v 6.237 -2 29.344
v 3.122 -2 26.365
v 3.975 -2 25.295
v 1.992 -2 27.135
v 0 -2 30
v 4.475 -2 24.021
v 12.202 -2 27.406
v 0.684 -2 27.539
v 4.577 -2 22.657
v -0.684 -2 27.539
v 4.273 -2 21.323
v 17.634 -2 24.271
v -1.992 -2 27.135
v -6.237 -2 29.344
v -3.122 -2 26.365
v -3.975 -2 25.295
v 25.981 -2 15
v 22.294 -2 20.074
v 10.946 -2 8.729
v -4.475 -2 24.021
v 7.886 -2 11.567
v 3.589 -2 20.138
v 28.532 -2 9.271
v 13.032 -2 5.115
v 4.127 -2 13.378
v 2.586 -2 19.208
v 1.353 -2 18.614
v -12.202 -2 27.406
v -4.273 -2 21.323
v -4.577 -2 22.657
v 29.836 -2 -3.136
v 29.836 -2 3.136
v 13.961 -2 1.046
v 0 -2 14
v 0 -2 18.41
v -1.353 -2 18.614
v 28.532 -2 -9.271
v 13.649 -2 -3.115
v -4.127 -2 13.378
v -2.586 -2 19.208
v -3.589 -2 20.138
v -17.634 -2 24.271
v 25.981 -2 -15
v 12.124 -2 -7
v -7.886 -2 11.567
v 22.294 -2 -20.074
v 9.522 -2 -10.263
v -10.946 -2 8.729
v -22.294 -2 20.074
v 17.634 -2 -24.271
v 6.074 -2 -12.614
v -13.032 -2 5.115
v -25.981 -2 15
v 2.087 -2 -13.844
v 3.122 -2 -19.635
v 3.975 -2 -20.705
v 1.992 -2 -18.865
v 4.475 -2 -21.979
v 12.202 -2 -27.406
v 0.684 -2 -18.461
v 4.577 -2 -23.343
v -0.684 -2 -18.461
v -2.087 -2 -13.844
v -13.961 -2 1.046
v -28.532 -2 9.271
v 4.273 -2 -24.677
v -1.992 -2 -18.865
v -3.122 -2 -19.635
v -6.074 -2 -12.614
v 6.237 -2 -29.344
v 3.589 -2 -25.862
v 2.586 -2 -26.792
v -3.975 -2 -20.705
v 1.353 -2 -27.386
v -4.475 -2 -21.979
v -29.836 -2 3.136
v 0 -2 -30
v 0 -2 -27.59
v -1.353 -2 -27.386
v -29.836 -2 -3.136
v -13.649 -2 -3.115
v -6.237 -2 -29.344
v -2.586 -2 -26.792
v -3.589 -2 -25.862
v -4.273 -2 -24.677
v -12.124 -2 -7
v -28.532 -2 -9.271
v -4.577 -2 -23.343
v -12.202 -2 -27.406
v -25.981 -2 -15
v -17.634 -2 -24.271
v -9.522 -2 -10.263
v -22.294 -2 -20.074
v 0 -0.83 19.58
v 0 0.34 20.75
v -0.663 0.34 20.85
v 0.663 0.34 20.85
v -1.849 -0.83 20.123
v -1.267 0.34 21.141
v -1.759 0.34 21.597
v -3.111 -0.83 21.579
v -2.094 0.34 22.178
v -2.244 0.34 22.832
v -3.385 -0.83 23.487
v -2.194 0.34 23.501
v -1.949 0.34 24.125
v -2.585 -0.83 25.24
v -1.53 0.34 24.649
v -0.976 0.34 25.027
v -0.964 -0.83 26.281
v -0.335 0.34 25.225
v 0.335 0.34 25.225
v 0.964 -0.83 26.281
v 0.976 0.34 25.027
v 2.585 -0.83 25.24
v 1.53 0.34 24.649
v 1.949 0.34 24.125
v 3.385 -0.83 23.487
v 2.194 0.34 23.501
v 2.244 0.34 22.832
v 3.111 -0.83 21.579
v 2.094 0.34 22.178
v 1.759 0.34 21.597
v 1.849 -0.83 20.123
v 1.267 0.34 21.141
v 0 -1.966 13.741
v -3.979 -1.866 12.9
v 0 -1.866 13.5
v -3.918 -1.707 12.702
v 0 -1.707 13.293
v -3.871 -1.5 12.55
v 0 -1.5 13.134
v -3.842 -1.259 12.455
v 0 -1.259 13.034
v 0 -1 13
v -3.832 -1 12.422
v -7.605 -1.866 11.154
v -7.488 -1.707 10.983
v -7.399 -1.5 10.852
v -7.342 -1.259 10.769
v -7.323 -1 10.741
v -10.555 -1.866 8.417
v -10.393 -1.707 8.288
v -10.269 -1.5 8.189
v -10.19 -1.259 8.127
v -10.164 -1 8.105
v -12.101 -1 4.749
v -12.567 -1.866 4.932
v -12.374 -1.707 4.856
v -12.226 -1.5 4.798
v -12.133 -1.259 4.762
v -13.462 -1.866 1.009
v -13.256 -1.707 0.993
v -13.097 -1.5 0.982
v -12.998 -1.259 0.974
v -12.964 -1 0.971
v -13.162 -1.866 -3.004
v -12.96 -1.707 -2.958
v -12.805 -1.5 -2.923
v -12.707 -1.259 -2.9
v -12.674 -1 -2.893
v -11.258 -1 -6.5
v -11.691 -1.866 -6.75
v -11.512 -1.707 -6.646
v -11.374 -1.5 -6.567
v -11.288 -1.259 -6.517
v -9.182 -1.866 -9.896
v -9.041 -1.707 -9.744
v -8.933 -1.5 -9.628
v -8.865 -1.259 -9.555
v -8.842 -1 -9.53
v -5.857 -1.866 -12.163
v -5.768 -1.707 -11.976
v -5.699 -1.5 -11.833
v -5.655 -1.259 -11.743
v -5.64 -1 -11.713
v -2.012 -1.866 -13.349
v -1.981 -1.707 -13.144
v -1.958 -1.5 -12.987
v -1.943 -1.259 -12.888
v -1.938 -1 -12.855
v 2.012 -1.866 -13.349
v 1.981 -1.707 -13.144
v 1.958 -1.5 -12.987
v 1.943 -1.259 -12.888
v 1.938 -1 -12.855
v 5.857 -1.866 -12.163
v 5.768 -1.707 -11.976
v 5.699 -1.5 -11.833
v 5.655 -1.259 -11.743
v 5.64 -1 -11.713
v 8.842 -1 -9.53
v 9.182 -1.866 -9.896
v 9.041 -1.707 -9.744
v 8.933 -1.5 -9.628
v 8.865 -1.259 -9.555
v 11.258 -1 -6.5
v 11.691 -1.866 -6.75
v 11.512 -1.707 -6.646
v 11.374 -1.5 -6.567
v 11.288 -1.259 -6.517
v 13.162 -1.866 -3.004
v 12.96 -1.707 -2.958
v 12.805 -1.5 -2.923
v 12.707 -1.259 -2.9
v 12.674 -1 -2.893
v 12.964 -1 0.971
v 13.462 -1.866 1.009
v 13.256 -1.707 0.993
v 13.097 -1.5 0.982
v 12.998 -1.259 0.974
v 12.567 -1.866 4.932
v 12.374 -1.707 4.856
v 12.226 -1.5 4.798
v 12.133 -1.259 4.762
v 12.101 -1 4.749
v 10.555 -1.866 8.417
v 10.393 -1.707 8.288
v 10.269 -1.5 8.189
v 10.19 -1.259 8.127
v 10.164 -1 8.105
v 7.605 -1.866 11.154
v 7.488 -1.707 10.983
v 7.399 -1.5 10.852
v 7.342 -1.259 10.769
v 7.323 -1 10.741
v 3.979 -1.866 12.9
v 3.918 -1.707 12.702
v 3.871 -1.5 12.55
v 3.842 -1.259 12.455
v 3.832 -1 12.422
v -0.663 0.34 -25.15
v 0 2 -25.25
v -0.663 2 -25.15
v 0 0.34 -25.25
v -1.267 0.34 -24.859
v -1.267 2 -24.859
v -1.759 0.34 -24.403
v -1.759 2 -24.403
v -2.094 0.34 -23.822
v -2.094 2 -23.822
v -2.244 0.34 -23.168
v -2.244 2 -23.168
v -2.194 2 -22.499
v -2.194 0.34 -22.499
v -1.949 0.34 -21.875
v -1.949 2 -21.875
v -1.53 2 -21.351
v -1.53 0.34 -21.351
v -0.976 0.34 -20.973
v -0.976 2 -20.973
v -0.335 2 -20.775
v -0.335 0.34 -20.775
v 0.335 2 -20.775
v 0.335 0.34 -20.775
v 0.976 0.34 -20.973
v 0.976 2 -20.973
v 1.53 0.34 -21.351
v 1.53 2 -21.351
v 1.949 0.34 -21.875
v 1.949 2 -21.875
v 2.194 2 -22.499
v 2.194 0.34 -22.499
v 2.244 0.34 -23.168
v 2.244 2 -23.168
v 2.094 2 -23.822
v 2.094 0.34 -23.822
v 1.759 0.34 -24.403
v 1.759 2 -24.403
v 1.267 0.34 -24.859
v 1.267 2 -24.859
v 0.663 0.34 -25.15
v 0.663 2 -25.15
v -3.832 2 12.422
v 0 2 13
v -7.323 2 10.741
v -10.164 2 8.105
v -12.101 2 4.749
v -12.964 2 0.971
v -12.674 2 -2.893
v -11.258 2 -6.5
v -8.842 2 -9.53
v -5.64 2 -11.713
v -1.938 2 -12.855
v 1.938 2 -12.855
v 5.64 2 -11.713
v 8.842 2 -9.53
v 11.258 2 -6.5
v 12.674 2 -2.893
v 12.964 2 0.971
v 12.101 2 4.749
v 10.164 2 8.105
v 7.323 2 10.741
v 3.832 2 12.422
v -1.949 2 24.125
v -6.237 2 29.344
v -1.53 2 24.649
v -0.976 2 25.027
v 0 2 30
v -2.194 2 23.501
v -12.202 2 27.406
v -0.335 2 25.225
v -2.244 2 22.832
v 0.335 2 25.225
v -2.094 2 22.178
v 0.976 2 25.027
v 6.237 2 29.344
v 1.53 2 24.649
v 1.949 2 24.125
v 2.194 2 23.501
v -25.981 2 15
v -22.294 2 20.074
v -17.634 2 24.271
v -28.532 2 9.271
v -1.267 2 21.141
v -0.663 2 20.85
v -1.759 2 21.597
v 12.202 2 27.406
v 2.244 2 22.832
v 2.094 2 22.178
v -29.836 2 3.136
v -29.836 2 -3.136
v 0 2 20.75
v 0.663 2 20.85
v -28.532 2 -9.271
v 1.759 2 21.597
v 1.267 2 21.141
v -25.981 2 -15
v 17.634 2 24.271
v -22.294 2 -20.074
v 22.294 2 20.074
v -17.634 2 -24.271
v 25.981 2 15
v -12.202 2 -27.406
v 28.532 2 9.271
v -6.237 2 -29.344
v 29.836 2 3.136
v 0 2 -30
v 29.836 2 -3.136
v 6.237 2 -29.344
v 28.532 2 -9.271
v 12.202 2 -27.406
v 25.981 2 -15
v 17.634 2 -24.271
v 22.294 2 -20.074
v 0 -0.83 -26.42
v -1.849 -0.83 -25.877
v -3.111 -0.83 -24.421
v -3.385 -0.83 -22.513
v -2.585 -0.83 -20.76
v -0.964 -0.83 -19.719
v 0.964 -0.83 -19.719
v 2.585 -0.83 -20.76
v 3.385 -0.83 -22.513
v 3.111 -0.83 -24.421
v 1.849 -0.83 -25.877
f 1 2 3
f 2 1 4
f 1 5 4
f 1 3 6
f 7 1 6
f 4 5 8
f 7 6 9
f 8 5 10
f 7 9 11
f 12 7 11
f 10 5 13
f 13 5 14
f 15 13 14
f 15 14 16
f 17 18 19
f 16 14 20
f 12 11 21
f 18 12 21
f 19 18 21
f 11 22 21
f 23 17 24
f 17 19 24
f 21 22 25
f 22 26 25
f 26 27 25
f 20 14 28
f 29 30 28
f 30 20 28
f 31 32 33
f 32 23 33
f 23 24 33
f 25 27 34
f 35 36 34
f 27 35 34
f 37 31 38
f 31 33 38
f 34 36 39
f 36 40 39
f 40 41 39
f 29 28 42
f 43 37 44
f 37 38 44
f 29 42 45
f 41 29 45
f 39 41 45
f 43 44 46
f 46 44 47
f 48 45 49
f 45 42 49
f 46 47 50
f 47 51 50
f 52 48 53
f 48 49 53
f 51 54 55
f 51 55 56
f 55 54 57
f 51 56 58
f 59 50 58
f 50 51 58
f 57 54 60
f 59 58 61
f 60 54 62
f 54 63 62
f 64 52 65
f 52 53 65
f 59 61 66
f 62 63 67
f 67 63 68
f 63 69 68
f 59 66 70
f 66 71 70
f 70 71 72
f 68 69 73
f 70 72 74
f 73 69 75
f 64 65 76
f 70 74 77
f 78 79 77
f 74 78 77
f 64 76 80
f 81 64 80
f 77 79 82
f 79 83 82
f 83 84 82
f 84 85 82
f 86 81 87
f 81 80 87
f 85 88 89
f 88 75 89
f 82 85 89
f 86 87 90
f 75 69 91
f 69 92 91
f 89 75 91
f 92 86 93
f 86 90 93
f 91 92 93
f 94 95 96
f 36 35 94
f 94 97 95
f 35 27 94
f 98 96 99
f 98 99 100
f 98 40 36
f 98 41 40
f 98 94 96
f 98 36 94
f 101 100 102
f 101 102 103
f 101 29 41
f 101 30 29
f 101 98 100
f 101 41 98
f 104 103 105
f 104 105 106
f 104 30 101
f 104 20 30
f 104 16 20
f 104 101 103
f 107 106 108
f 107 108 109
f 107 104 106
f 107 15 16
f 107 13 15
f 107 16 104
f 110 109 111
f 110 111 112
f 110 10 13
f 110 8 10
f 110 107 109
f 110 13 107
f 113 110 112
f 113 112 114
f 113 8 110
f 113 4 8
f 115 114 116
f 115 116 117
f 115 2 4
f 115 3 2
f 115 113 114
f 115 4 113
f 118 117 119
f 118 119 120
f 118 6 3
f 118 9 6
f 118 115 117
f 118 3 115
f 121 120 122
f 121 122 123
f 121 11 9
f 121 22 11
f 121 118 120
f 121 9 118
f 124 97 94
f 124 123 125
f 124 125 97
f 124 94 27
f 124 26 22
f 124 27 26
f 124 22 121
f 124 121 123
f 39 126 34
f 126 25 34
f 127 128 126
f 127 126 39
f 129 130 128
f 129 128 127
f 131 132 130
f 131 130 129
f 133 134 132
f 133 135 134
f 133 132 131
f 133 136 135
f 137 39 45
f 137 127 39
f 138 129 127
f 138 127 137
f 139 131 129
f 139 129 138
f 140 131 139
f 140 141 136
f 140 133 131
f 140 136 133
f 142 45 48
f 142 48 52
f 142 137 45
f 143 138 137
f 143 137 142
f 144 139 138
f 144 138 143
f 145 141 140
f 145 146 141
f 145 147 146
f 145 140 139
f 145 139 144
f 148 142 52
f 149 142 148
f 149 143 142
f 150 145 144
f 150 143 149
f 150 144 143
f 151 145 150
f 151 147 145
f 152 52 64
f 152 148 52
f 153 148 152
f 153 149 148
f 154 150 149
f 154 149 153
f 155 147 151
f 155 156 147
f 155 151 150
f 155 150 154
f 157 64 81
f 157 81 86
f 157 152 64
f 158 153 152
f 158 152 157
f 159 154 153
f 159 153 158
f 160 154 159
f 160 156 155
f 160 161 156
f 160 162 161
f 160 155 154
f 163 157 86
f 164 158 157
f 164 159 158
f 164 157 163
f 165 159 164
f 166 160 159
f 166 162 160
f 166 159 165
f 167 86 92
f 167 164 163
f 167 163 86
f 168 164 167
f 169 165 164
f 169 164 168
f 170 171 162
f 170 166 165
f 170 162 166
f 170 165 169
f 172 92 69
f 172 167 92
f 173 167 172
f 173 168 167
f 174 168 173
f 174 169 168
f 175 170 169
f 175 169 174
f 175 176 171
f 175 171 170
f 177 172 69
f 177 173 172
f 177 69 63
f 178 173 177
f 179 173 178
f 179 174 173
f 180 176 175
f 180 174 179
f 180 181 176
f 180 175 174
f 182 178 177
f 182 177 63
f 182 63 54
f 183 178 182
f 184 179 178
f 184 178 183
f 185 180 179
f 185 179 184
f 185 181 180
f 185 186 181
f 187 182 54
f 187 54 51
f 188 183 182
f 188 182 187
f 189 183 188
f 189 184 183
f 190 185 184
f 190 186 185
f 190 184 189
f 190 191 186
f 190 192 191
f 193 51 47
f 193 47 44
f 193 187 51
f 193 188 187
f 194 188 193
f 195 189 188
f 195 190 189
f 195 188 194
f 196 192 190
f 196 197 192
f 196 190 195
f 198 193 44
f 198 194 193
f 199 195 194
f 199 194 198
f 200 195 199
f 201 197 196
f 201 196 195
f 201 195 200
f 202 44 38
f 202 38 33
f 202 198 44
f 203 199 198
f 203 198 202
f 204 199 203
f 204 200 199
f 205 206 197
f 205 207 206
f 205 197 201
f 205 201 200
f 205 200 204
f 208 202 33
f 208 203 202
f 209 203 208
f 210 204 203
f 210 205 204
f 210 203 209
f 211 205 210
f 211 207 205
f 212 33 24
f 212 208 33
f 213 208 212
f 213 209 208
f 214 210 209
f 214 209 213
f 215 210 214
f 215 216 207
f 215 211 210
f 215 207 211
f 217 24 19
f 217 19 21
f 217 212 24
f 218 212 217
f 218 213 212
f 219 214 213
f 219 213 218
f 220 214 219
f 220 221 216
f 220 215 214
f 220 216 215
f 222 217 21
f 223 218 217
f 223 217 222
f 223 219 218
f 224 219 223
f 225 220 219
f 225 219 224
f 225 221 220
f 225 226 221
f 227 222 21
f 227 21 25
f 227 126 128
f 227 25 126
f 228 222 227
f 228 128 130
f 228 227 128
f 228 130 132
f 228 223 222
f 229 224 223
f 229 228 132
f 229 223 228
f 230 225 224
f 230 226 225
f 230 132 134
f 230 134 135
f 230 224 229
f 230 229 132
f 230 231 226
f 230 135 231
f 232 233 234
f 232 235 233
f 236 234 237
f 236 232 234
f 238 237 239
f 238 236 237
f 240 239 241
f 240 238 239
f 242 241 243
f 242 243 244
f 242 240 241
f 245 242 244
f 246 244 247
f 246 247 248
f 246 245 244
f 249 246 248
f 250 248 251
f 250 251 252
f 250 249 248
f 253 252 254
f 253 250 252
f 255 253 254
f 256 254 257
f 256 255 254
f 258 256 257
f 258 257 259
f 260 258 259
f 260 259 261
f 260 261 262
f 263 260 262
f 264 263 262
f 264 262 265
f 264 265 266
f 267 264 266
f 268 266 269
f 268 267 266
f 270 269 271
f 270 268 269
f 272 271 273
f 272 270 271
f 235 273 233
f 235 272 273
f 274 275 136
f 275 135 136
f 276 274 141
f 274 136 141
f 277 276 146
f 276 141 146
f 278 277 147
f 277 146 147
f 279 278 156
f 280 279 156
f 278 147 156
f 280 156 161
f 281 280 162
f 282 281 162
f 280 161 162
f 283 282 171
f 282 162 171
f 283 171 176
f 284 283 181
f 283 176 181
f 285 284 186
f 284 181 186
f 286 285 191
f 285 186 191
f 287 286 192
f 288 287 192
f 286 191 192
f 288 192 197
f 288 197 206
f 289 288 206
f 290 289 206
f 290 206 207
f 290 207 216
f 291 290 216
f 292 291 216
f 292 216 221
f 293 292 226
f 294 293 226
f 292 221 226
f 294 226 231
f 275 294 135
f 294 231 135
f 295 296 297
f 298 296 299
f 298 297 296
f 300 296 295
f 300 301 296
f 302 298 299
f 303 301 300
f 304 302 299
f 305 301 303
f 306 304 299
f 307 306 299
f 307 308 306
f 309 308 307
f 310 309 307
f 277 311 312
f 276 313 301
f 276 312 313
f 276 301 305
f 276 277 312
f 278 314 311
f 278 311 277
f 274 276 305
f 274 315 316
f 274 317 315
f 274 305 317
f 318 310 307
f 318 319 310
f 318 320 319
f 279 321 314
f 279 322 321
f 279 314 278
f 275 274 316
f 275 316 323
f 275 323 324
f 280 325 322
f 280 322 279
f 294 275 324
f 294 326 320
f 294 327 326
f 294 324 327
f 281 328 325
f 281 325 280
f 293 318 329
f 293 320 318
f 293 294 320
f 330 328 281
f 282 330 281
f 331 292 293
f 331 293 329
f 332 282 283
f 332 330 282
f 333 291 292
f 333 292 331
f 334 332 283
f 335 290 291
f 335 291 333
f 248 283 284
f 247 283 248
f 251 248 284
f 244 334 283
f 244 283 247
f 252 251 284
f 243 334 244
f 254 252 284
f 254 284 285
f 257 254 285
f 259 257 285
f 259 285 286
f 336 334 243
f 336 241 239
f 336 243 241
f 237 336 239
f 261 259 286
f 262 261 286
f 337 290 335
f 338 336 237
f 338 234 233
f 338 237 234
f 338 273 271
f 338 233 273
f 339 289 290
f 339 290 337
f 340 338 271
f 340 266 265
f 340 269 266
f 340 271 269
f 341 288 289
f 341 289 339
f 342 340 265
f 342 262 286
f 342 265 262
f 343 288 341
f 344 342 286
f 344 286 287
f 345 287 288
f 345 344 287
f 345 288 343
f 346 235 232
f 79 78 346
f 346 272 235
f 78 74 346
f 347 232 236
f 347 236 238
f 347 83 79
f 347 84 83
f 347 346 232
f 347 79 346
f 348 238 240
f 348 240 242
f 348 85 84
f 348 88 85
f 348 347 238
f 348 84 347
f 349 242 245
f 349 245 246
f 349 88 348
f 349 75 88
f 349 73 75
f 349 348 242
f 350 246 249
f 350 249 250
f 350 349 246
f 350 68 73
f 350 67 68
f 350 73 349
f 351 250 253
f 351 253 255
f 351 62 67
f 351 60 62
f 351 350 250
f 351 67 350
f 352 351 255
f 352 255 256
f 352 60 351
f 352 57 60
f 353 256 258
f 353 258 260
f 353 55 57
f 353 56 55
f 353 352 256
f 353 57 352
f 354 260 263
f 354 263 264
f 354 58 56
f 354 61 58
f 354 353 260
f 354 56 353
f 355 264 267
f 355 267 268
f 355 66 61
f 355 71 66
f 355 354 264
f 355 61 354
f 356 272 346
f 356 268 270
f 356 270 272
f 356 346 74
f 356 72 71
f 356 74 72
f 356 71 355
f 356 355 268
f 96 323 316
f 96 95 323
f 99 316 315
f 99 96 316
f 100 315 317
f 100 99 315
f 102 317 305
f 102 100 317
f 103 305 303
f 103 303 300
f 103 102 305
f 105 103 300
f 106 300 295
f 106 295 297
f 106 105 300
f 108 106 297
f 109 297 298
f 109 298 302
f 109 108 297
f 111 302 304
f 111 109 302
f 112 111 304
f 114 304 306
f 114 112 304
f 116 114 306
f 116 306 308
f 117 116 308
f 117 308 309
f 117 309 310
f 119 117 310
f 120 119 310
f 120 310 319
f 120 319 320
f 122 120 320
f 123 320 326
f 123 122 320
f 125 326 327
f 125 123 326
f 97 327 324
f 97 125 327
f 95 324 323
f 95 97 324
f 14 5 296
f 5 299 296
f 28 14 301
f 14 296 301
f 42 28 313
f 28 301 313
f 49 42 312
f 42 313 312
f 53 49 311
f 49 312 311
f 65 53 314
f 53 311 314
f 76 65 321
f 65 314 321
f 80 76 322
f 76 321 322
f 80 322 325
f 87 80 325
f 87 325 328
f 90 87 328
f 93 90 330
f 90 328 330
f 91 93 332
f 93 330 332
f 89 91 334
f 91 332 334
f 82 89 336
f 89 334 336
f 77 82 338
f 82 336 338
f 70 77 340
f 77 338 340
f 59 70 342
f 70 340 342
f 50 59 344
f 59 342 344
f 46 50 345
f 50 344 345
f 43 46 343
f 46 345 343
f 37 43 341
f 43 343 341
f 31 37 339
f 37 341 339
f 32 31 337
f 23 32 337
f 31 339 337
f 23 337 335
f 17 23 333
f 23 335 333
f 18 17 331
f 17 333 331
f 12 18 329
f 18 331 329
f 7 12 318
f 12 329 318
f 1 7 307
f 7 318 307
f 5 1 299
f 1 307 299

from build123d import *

# Parameters (mm, degrees)
CSK_FOR_M4_HEX_SOCKET_COUNTERSUNK_HE_2_COUNT = 2
CSK_FOR_M4_HEX_SOCKET_COUNTERSUNK_HE_2_PITCH = 46
FILLET1_R                                    = 1
CHAMFER1_SIZE                                = 0.5
SKETCH6_R                                    = 20.074468172
CUT_EXTRUDE2_DEPTH                           = 10


with BuildPart() as part:
    # Sketch1 → Revolve1 (revolve)
    with BuildSketch(Plane.XY, mode=Mode.PRIVATE) as revolve1_sk:
        Polygon((-30, -2), (-30, 2), (-16, 2), (-16, 4), (-13, 4), (-13, -2), align=None)
    revolve(revolve1_sk.sketch.rotate(Axis((0, 55, 0), (0, -1, 0)), 270), axis=Axis((0, 55, 0), (0, -1, 0)))

    # Sketch3 → CSK for M4 Hex Socket Countersunk Head Screw2 (revolve, cut)
    with BuildSketch(Plane(origin=(0, -2, 23), x_dir=(0, 0, -1), z_dir=(1, 0, 0))):
        Polygon((0, 0), (0, 4), (2.25, 4), (2.25, 2.34), (4.59, 0), align=None)
    csk_for_m4_hex_socket_countersunk_head_s = revolve(axis=Axis((0, -8.35, 23), (0, 1, 0)), mode=Mode.SUBTRACT)

    # CSK for M4 Hex Socket Countersunk He 2: CSK for M4 Hex Socket Countersunk Head Screw2 ×2
    with Locations(*[(0, 0, -i * CSK_FOR_M4_HEX_SOCKET_COUNTERSUNK_HE_2_PITCH) for i in range(1, CSK_FOR_M4_HEX_SOCKET_COUNTERSUNK_HE_2_COUNT)]):
        add(csk_for_m4_hex_socket_countersunk_head_s, mode=Mode.SUBTRACT)

    # Fillet1
    fillet1_edges = [part.edges().sort_by_distance(p)[0] for p in [
        (0, -2, -13),
    ]]
    fillet(fillet1_edges, radius=FILLET1_R)

    # Chamfer1
    chamfer1_edges = [part.edges().sort_by_distance(p)[0] for p in [
        (0, 4, -16),
    ]]
    chamfer(chamfer1_edges, length=CHAMFER1_SIZE)

    # Sketch6 → Cut-Extrude2 (cut)
    with BuildSketch(Plane(origin=(0, 2, 0), x_dir=(1, 0, 0), z_dir=(0, 1, 0))):
        Circle(SKETCH6_R)
    extrude(amount=CUT_EXTRUDE2_DEPTH, mode=Mode.SUBTRACT)


solid = part.part
